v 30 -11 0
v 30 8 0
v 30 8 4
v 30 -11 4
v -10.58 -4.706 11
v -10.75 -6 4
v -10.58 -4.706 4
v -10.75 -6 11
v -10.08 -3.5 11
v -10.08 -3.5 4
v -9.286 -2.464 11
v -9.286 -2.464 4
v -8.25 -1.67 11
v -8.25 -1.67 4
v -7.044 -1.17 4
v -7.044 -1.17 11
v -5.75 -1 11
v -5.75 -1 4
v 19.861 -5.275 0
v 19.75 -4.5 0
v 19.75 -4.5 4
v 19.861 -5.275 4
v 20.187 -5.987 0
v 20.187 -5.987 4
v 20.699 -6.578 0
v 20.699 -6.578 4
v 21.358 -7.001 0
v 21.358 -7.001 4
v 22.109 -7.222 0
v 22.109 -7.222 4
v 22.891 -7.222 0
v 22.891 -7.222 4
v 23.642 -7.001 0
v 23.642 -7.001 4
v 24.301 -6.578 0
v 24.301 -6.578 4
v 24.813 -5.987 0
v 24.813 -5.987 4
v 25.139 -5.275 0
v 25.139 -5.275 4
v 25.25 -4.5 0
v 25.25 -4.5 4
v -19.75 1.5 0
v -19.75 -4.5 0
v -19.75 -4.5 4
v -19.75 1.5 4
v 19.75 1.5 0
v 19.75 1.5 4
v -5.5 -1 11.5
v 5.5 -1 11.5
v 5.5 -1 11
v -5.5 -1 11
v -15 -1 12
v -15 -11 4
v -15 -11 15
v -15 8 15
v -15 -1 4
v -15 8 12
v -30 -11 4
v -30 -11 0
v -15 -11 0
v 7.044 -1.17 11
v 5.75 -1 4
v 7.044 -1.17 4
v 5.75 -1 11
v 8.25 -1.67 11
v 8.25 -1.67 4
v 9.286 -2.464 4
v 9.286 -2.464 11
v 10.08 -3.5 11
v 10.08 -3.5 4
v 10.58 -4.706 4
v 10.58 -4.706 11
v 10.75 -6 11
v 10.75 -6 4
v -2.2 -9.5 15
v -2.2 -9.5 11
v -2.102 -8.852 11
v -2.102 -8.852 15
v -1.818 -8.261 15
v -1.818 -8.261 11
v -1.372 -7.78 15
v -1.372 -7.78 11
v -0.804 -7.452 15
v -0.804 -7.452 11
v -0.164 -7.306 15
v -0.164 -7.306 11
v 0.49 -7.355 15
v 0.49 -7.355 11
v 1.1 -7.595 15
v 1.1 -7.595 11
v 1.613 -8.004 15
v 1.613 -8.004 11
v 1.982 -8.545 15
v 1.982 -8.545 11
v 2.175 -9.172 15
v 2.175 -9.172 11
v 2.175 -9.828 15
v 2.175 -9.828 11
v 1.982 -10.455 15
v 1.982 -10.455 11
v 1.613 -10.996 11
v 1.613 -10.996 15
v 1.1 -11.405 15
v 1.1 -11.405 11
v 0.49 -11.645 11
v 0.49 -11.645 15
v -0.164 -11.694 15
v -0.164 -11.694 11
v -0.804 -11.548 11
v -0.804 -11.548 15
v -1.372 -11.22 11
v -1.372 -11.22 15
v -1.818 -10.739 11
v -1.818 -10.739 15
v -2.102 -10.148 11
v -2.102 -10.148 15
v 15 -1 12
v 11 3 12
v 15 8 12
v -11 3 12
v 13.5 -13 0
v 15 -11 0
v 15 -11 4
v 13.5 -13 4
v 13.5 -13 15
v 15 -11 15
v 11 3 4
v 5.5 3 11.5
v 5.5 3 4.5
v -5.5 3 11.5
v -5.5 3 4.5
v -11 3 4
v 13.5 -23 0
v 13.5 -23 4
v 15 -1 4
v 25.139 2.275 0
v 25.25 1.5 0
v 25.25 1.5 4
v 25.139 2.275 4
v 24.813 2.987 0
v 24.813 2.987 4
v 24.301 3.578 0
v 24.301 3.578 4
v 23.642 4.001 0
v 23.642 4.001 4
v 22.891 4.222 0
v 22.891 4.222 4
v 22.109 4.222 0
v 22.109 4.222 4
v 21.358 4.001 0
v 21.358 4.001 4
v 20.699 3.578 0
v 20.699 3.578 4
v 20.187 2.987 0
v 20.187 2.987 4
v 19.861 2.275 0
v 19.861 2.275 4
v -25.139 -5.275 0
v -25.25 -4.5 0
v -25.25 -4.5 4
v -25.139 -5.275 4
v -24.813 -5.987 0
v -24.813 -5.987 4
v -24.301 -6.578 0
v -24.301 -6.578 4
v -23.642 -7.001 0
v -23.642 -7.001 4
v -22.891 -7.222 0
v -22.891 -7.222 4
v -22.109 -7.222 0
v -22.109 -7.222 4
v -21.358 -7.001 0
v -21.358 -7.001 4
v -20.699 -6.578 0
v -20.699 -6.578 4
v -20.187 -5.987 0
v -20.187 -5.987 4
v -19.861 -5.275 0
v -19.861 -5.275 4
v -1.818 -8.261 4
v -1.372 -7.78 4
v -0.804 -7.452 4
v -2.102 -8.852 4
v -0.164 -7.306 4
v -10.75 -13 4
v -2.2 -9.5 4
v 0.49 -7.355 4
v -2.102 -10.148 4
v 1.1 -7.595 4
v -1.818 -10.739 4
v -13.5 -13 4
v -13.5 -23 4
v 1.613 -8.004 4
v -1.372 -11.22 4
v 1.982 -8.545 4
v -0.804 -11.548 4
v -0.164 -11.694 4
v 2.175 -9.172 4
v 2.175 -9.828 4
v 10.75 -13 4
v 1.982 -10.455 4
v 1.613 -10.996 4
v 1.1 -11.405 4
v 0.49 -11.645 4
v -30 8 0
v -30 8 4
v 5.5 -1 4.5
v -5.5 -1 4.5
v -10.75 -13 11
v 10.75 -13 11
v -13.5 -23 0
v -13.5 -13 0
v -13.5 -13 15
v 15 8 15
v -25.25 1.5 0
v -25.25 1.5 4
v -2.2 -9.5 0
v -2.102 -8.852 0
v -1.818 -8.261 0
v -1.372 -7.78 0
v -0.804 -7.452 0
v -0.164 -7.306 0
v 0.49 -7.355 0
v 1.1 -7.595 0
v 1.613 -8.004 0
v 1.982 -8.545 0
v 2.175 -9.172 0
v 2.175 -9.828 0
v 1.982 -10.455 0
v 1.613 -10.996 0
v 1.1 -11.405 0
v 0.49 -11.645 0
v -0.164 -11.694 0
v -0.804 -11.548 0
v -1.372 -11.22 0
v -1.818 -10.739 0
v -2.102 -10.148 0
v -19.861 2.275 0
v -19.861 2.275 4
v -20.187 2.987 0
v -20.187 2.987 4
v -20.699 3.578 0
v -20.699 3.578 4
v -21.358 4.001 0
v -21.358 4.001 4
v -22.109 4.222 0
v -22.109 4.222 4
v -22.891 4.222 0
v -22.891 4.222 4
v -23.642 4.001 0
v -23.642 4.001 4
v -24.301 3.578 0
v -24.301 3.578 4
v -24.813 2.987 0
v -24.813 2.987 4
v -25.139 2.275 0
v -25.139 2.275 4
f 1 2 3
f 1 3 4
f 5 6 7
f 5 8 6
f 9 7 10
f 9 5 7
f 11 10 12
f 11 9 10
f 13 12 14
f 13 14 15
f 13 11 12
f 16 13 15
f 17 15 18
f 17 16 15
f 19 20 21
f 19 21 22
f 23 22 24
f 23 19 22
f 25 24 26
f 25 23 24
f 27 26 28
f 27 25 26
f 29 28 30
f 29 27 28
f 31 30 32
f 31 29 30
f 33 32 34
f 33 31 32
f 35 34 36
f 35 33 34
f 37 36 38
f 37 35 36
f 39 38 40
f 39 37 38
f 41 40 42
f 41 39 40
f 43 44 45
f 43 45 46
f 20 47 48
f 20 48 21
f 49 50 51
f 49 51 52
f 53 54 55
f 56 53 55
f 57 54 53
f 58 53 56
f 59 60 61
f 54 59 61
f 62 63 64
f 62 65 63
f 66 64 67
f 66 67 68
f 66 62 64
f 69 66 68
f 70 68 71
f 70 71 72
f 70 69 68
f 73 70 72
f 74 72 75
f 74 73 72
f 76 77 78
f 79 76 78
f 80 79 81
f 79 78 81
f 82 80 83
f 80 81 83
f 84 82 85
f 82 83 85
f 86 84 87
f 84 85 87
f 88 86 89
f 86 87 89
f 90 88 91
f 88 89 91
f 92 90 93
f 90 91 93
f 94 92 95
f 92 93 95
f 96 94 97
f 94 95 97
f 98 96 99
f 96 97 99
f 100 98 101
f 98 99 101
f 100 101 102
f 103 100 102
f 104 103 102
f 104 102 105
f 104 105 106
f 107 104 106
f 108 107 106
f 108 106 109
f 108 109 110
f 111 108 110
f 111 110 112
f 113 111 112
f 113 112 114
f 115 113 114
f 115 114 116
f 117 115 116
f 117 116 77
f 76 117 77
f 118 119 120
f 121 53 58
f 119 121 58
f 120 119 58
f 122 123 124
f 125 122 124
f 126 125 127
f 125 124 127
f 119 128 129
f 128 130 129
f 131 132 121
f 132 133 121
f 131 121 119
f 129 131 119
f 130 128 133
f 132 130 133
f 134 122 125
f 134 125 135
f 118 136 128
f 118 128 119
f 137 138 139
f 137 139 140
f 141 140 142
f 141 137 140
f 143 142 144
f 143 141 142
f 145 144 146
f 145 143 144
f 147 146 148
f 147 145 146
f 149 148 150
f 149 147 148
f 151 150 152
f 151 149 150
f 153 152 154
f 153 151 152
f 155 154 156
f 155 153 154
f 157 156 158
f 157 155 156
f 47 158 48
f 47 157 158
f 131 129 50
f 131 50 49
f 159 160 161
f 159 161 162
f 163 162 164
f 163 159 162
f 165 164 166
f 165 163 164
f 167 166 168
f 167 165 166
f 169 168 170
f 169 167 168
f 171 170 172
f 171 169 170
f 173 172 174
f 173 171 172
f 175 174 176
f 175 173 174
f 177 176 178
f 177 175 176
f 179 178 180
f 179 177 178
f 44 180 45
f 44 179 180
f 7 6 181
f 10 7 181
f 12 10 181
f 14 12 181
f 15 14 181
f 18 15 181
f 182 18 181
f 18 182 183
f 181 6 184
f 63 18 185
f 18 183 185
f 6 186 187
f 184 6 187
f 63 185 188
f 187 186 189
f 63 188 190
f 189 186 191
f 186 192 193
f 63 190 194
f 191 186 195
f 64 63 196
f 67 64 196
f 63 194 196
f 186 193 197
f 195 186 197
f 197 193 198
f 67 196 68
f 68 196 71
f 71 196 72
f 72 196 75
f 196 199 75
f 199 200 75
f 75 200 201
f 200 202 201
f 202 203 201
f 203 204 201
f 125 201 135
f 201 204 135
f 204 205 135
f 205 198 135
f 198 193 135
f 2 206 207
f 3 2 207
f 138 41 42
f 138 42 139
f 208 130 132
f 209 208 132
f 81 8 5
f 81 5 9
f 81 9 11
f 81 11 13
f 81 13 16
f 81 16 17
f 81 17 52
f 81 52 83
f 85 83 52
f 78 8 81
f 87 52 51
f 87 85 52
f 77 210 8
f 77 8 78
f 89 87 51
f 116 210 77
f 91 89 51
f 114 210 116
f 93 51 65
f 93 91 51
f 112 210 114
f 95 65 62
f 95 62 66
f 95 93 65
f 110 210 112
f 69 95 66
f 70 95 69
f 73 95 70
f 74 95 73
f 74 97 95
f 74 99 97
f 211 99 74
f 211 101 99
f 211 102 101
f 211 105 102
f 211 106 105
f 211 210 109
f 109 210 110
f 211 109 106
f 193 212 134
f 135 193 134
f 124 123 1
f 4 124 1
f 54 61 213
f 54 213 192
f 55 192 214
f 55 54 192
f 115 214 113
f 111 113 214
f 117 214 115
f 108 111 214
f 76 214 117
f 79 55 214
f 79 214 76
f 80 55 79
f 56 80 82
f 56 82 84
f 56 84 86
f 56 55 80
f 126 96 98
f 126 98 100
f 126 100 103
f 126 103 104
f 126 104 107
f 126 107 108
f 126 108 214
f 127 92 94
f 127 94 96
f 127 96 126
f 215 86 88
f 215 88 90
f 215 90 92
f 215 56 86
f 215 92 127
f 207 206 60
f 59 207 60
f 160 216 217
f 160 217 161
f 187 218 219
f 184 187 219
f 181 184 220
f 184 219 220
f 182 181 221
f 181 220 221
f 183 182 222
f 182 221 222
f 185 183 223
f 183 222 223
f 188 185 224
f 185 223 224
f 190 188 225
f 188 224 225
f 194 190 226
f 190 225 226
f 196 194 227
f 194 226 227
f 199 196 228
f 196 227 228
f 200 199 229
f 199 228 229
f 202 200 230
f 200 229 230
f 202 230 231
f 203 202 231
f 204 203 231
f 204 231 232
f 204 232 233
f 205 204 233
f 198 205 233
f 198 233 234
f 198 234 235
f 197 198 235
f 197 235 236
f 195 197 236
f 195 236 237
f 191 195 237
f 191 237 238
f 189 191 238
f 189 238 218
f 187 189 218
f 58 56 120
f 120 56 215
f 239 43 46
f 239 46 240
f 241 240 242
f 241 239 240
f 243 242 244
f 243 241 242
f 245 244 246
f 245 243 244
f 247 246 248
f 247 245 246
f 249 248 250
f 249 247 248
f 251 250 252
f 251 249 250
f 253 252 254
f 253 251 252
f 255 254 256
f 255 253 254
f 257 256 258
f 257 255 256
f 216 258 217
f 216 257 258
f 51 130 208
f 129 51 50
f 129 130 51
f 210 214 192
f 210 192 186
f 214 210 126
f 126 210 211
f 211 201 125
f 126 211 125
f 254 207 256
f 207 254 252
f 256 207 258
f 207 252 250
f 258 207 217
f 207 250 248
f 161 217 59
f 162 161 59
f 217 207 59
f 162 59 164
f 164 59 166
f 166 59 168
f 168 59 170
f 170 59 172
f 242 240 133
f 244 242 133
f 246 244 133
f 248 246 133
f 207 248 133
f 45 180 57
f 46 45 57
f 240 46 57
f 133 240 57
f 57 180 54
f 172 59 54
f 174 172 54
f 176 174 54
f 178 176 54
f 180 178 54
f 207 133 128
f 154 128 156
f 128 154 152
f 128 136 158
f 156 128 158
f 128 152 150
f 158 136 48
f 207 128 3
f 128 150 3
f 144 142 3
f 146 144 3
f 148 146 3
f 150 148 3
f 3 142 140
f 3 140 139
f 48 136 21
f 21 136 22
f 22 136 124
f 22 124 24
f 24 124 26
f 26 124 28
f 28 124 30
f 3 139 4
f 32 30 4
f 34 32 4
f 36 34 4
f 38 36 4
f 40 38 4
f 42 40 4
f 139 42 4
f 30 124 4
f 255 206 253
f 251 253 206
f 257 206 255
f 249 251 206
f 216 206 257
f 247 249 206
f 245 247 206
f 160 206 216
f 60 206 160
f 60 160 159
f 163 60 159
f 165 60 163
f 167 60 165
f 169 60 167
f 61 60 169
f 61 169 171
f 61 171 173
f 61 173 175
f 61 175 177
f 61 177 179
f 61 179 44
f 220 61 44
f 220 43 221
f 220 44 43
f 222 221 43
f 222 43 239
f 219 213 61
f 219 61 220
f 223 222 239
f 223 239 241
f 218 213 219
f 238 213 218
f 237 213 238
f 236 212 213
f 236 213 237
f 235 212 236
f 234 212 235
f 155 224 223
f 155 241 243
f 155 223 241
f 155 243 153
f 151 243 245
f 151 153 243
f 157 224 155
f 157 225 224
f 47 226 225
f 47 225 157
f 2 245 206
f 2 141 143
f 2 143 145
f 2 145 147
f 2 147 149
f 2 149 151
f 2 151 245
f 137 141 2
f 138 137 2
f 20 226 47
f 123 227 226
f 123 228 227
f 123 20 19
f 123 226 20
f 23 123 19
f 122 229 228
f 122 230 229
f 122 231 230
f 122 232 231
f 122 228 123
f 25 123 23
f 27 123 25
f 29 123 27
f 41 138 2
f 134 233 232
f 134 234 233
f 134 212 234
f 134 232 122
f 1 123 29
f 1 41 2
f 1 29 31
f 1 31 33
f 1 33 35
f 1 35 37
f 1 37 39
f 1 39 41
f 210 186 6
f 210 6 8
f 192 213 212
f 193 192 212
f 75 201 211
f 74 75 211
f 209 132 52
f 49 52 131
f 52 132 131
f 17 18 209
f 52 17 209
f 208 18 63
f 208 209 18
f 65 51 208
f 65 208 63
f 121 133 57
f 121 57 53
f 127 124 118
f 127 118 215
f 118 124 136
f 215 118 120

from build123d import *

# Parameters (mm, degrees)
F0_W      = 30
F0_H      = 26
F1_DEPTH  = 15
F3_SIZE2  = 2
F3_SIZE   = 1.5
F5_DEPTH  = 30.001
F6_SIZE   = 4
F2_W      = 21.5
F2_H      = 7
F7_DEPTH  = 12
F8_W      = 11
F8_H      = 7
F9_DEPTH  = 4
F10_R     = 5
F11_R     = 5
F12_W     = 30
F12_H     = 5
F13_DEPTH = 15.001
F15_D     = 4.4
F16_W     = 27
F16_H     = 10
F16_W_2   = 15
F16_H_2   = 19
F17_DEPTH = 4


with BuildPart() as f1:
    # F0 (on Top) → F1 (new body)
    with BuildSketch(Plane.XY):
        Rectangle(F0_W, F0_H)
    extrude(amount=F1_DEPTH)

    # F3
    f3_edges = [f1.edges().sort_by_distance(p)[0] for p in [
        (-15, -13, 7.5),
        (15, -13, 7.5),
    ]]
    f3_side = f1.faces().sort_by_distance((0, -13, 7.5))[0]
    chamfer(f3_edges, length=F3_SIZE, length2=F3_SIZE2, reference=f3_side)

    # F4 (on face) → F5 (cut, through all)
    with BuildSketch(Plane(origin=(-15, 0, 0), x_dir=(0, -1, 0), z_dir=(-1, 0, 0))):
        Polygon((-13, 12), (-13, 0), (-8, 0), (-8, 4), (-3, 4), (-3, 12), align=None)
    extrude(amount=-F5_DEPTH, mode=Mode.SUBTRACT)

    # F6
    f6_edges = [f1.edges().sort_by_distance(p)[0] for p in [
        (-15, 3, 8),
        (15, 3, 8),
    ]]
    chamfer(f6_edges, length=F6_SIZE)

    # F2 (on face) → F7 (cut)
    with BuildSketch(Plane.XZ.offset(13)):
        with Locations((0, 7.5)):
            Rectangle(F2_W, F2_H)
    extrude(amount=-F7_DEPTH, mode=Mode.SUBTRACT)

    # F8 (on face) → F9 (cut)
    with BuildSketch(Plane(origin=(0, 3, 0), x_dir=(-1, 0, 0), z_dir=(0, 1, 0))):
        with Locations((0, 8)):
            Rectangle(F8_W, F8_H)
    extrude(amount=-F9_DEPTH, mode=Mode.SUBTRACT)

    # F10
    f10_edges = [f1.edges().sort_by_distance(p)[0] for p in [
        (-10.75, -1, 7.5),
    ]]
    fillet(f10_edges, radius=F10_R)

    # F11
    f11_edges = [f1.edges().sort_by_distance(p)[0] for p in [
        (10.75, -1, 7.5),
    ]]
    fillet(f11_edges, radius=F11_R)

    # F12 (on face) → F13 (cut, through all)
    with BuildSketch(Plane.XY.offset(15)):
        with Locations((0, 10.5)):
            Rectangle(F12_W, F12_H)
    extrude(amount=-F13_DEPTH, mode=Mode.SUBTRACT)

    # F15 (through all)
    with Locations(Plane.XY.offset(15)):
        with Locations((0, -9.5)):
            Hole(F15_D / 2)

    # F16 (on face) → F17 (join)
    with BuildSketch(Plane(origin=(0, 0, 0), x_dir=(1, 0, 0), z_dir=(0, 0, -1))):
        with Locations((0, 18)):
            Rectangle(F16_W, F16_H)
        with Locations((22.5, 1.5)):
            Rectangle(F16_W_2, F16_H_2)
        with BuildLine():
            Line((19.75, -1.5), (19.75, 4.5))
            ThreePointArc((19.75, 4.5), (22.5, 7.25), (25.25, 4.5))
            Line((25.25, 4.5), (25.25, -1.5))
            ThreePointArc((25.25, -1.5), (22.5, -4.25), (19.75, -1.5))
        make_face(mode=Mode.SUBTRACT)
        with Locations((-22.5, 1.5)):
            Rectangle(F16_W_2, F16_H_2)
        with BuildLine():
            ThreePointArc((-25.25, 4.5), (-22.5, 7.25), (-19.75, 4.5))
            Line((-19.75, 4.5), (-19.75, -1.5))
            ThreePointArc((-19.75, -1.5), (-22.5, -4.25), (-25.25, -1.5))
            Line((-25.25, -1.5), (-25.25, 4.5))
        make_face(mode=Mode.SUBTRACT)
    extrude(amount=-F17_DEPTH)


solid = f1.part
